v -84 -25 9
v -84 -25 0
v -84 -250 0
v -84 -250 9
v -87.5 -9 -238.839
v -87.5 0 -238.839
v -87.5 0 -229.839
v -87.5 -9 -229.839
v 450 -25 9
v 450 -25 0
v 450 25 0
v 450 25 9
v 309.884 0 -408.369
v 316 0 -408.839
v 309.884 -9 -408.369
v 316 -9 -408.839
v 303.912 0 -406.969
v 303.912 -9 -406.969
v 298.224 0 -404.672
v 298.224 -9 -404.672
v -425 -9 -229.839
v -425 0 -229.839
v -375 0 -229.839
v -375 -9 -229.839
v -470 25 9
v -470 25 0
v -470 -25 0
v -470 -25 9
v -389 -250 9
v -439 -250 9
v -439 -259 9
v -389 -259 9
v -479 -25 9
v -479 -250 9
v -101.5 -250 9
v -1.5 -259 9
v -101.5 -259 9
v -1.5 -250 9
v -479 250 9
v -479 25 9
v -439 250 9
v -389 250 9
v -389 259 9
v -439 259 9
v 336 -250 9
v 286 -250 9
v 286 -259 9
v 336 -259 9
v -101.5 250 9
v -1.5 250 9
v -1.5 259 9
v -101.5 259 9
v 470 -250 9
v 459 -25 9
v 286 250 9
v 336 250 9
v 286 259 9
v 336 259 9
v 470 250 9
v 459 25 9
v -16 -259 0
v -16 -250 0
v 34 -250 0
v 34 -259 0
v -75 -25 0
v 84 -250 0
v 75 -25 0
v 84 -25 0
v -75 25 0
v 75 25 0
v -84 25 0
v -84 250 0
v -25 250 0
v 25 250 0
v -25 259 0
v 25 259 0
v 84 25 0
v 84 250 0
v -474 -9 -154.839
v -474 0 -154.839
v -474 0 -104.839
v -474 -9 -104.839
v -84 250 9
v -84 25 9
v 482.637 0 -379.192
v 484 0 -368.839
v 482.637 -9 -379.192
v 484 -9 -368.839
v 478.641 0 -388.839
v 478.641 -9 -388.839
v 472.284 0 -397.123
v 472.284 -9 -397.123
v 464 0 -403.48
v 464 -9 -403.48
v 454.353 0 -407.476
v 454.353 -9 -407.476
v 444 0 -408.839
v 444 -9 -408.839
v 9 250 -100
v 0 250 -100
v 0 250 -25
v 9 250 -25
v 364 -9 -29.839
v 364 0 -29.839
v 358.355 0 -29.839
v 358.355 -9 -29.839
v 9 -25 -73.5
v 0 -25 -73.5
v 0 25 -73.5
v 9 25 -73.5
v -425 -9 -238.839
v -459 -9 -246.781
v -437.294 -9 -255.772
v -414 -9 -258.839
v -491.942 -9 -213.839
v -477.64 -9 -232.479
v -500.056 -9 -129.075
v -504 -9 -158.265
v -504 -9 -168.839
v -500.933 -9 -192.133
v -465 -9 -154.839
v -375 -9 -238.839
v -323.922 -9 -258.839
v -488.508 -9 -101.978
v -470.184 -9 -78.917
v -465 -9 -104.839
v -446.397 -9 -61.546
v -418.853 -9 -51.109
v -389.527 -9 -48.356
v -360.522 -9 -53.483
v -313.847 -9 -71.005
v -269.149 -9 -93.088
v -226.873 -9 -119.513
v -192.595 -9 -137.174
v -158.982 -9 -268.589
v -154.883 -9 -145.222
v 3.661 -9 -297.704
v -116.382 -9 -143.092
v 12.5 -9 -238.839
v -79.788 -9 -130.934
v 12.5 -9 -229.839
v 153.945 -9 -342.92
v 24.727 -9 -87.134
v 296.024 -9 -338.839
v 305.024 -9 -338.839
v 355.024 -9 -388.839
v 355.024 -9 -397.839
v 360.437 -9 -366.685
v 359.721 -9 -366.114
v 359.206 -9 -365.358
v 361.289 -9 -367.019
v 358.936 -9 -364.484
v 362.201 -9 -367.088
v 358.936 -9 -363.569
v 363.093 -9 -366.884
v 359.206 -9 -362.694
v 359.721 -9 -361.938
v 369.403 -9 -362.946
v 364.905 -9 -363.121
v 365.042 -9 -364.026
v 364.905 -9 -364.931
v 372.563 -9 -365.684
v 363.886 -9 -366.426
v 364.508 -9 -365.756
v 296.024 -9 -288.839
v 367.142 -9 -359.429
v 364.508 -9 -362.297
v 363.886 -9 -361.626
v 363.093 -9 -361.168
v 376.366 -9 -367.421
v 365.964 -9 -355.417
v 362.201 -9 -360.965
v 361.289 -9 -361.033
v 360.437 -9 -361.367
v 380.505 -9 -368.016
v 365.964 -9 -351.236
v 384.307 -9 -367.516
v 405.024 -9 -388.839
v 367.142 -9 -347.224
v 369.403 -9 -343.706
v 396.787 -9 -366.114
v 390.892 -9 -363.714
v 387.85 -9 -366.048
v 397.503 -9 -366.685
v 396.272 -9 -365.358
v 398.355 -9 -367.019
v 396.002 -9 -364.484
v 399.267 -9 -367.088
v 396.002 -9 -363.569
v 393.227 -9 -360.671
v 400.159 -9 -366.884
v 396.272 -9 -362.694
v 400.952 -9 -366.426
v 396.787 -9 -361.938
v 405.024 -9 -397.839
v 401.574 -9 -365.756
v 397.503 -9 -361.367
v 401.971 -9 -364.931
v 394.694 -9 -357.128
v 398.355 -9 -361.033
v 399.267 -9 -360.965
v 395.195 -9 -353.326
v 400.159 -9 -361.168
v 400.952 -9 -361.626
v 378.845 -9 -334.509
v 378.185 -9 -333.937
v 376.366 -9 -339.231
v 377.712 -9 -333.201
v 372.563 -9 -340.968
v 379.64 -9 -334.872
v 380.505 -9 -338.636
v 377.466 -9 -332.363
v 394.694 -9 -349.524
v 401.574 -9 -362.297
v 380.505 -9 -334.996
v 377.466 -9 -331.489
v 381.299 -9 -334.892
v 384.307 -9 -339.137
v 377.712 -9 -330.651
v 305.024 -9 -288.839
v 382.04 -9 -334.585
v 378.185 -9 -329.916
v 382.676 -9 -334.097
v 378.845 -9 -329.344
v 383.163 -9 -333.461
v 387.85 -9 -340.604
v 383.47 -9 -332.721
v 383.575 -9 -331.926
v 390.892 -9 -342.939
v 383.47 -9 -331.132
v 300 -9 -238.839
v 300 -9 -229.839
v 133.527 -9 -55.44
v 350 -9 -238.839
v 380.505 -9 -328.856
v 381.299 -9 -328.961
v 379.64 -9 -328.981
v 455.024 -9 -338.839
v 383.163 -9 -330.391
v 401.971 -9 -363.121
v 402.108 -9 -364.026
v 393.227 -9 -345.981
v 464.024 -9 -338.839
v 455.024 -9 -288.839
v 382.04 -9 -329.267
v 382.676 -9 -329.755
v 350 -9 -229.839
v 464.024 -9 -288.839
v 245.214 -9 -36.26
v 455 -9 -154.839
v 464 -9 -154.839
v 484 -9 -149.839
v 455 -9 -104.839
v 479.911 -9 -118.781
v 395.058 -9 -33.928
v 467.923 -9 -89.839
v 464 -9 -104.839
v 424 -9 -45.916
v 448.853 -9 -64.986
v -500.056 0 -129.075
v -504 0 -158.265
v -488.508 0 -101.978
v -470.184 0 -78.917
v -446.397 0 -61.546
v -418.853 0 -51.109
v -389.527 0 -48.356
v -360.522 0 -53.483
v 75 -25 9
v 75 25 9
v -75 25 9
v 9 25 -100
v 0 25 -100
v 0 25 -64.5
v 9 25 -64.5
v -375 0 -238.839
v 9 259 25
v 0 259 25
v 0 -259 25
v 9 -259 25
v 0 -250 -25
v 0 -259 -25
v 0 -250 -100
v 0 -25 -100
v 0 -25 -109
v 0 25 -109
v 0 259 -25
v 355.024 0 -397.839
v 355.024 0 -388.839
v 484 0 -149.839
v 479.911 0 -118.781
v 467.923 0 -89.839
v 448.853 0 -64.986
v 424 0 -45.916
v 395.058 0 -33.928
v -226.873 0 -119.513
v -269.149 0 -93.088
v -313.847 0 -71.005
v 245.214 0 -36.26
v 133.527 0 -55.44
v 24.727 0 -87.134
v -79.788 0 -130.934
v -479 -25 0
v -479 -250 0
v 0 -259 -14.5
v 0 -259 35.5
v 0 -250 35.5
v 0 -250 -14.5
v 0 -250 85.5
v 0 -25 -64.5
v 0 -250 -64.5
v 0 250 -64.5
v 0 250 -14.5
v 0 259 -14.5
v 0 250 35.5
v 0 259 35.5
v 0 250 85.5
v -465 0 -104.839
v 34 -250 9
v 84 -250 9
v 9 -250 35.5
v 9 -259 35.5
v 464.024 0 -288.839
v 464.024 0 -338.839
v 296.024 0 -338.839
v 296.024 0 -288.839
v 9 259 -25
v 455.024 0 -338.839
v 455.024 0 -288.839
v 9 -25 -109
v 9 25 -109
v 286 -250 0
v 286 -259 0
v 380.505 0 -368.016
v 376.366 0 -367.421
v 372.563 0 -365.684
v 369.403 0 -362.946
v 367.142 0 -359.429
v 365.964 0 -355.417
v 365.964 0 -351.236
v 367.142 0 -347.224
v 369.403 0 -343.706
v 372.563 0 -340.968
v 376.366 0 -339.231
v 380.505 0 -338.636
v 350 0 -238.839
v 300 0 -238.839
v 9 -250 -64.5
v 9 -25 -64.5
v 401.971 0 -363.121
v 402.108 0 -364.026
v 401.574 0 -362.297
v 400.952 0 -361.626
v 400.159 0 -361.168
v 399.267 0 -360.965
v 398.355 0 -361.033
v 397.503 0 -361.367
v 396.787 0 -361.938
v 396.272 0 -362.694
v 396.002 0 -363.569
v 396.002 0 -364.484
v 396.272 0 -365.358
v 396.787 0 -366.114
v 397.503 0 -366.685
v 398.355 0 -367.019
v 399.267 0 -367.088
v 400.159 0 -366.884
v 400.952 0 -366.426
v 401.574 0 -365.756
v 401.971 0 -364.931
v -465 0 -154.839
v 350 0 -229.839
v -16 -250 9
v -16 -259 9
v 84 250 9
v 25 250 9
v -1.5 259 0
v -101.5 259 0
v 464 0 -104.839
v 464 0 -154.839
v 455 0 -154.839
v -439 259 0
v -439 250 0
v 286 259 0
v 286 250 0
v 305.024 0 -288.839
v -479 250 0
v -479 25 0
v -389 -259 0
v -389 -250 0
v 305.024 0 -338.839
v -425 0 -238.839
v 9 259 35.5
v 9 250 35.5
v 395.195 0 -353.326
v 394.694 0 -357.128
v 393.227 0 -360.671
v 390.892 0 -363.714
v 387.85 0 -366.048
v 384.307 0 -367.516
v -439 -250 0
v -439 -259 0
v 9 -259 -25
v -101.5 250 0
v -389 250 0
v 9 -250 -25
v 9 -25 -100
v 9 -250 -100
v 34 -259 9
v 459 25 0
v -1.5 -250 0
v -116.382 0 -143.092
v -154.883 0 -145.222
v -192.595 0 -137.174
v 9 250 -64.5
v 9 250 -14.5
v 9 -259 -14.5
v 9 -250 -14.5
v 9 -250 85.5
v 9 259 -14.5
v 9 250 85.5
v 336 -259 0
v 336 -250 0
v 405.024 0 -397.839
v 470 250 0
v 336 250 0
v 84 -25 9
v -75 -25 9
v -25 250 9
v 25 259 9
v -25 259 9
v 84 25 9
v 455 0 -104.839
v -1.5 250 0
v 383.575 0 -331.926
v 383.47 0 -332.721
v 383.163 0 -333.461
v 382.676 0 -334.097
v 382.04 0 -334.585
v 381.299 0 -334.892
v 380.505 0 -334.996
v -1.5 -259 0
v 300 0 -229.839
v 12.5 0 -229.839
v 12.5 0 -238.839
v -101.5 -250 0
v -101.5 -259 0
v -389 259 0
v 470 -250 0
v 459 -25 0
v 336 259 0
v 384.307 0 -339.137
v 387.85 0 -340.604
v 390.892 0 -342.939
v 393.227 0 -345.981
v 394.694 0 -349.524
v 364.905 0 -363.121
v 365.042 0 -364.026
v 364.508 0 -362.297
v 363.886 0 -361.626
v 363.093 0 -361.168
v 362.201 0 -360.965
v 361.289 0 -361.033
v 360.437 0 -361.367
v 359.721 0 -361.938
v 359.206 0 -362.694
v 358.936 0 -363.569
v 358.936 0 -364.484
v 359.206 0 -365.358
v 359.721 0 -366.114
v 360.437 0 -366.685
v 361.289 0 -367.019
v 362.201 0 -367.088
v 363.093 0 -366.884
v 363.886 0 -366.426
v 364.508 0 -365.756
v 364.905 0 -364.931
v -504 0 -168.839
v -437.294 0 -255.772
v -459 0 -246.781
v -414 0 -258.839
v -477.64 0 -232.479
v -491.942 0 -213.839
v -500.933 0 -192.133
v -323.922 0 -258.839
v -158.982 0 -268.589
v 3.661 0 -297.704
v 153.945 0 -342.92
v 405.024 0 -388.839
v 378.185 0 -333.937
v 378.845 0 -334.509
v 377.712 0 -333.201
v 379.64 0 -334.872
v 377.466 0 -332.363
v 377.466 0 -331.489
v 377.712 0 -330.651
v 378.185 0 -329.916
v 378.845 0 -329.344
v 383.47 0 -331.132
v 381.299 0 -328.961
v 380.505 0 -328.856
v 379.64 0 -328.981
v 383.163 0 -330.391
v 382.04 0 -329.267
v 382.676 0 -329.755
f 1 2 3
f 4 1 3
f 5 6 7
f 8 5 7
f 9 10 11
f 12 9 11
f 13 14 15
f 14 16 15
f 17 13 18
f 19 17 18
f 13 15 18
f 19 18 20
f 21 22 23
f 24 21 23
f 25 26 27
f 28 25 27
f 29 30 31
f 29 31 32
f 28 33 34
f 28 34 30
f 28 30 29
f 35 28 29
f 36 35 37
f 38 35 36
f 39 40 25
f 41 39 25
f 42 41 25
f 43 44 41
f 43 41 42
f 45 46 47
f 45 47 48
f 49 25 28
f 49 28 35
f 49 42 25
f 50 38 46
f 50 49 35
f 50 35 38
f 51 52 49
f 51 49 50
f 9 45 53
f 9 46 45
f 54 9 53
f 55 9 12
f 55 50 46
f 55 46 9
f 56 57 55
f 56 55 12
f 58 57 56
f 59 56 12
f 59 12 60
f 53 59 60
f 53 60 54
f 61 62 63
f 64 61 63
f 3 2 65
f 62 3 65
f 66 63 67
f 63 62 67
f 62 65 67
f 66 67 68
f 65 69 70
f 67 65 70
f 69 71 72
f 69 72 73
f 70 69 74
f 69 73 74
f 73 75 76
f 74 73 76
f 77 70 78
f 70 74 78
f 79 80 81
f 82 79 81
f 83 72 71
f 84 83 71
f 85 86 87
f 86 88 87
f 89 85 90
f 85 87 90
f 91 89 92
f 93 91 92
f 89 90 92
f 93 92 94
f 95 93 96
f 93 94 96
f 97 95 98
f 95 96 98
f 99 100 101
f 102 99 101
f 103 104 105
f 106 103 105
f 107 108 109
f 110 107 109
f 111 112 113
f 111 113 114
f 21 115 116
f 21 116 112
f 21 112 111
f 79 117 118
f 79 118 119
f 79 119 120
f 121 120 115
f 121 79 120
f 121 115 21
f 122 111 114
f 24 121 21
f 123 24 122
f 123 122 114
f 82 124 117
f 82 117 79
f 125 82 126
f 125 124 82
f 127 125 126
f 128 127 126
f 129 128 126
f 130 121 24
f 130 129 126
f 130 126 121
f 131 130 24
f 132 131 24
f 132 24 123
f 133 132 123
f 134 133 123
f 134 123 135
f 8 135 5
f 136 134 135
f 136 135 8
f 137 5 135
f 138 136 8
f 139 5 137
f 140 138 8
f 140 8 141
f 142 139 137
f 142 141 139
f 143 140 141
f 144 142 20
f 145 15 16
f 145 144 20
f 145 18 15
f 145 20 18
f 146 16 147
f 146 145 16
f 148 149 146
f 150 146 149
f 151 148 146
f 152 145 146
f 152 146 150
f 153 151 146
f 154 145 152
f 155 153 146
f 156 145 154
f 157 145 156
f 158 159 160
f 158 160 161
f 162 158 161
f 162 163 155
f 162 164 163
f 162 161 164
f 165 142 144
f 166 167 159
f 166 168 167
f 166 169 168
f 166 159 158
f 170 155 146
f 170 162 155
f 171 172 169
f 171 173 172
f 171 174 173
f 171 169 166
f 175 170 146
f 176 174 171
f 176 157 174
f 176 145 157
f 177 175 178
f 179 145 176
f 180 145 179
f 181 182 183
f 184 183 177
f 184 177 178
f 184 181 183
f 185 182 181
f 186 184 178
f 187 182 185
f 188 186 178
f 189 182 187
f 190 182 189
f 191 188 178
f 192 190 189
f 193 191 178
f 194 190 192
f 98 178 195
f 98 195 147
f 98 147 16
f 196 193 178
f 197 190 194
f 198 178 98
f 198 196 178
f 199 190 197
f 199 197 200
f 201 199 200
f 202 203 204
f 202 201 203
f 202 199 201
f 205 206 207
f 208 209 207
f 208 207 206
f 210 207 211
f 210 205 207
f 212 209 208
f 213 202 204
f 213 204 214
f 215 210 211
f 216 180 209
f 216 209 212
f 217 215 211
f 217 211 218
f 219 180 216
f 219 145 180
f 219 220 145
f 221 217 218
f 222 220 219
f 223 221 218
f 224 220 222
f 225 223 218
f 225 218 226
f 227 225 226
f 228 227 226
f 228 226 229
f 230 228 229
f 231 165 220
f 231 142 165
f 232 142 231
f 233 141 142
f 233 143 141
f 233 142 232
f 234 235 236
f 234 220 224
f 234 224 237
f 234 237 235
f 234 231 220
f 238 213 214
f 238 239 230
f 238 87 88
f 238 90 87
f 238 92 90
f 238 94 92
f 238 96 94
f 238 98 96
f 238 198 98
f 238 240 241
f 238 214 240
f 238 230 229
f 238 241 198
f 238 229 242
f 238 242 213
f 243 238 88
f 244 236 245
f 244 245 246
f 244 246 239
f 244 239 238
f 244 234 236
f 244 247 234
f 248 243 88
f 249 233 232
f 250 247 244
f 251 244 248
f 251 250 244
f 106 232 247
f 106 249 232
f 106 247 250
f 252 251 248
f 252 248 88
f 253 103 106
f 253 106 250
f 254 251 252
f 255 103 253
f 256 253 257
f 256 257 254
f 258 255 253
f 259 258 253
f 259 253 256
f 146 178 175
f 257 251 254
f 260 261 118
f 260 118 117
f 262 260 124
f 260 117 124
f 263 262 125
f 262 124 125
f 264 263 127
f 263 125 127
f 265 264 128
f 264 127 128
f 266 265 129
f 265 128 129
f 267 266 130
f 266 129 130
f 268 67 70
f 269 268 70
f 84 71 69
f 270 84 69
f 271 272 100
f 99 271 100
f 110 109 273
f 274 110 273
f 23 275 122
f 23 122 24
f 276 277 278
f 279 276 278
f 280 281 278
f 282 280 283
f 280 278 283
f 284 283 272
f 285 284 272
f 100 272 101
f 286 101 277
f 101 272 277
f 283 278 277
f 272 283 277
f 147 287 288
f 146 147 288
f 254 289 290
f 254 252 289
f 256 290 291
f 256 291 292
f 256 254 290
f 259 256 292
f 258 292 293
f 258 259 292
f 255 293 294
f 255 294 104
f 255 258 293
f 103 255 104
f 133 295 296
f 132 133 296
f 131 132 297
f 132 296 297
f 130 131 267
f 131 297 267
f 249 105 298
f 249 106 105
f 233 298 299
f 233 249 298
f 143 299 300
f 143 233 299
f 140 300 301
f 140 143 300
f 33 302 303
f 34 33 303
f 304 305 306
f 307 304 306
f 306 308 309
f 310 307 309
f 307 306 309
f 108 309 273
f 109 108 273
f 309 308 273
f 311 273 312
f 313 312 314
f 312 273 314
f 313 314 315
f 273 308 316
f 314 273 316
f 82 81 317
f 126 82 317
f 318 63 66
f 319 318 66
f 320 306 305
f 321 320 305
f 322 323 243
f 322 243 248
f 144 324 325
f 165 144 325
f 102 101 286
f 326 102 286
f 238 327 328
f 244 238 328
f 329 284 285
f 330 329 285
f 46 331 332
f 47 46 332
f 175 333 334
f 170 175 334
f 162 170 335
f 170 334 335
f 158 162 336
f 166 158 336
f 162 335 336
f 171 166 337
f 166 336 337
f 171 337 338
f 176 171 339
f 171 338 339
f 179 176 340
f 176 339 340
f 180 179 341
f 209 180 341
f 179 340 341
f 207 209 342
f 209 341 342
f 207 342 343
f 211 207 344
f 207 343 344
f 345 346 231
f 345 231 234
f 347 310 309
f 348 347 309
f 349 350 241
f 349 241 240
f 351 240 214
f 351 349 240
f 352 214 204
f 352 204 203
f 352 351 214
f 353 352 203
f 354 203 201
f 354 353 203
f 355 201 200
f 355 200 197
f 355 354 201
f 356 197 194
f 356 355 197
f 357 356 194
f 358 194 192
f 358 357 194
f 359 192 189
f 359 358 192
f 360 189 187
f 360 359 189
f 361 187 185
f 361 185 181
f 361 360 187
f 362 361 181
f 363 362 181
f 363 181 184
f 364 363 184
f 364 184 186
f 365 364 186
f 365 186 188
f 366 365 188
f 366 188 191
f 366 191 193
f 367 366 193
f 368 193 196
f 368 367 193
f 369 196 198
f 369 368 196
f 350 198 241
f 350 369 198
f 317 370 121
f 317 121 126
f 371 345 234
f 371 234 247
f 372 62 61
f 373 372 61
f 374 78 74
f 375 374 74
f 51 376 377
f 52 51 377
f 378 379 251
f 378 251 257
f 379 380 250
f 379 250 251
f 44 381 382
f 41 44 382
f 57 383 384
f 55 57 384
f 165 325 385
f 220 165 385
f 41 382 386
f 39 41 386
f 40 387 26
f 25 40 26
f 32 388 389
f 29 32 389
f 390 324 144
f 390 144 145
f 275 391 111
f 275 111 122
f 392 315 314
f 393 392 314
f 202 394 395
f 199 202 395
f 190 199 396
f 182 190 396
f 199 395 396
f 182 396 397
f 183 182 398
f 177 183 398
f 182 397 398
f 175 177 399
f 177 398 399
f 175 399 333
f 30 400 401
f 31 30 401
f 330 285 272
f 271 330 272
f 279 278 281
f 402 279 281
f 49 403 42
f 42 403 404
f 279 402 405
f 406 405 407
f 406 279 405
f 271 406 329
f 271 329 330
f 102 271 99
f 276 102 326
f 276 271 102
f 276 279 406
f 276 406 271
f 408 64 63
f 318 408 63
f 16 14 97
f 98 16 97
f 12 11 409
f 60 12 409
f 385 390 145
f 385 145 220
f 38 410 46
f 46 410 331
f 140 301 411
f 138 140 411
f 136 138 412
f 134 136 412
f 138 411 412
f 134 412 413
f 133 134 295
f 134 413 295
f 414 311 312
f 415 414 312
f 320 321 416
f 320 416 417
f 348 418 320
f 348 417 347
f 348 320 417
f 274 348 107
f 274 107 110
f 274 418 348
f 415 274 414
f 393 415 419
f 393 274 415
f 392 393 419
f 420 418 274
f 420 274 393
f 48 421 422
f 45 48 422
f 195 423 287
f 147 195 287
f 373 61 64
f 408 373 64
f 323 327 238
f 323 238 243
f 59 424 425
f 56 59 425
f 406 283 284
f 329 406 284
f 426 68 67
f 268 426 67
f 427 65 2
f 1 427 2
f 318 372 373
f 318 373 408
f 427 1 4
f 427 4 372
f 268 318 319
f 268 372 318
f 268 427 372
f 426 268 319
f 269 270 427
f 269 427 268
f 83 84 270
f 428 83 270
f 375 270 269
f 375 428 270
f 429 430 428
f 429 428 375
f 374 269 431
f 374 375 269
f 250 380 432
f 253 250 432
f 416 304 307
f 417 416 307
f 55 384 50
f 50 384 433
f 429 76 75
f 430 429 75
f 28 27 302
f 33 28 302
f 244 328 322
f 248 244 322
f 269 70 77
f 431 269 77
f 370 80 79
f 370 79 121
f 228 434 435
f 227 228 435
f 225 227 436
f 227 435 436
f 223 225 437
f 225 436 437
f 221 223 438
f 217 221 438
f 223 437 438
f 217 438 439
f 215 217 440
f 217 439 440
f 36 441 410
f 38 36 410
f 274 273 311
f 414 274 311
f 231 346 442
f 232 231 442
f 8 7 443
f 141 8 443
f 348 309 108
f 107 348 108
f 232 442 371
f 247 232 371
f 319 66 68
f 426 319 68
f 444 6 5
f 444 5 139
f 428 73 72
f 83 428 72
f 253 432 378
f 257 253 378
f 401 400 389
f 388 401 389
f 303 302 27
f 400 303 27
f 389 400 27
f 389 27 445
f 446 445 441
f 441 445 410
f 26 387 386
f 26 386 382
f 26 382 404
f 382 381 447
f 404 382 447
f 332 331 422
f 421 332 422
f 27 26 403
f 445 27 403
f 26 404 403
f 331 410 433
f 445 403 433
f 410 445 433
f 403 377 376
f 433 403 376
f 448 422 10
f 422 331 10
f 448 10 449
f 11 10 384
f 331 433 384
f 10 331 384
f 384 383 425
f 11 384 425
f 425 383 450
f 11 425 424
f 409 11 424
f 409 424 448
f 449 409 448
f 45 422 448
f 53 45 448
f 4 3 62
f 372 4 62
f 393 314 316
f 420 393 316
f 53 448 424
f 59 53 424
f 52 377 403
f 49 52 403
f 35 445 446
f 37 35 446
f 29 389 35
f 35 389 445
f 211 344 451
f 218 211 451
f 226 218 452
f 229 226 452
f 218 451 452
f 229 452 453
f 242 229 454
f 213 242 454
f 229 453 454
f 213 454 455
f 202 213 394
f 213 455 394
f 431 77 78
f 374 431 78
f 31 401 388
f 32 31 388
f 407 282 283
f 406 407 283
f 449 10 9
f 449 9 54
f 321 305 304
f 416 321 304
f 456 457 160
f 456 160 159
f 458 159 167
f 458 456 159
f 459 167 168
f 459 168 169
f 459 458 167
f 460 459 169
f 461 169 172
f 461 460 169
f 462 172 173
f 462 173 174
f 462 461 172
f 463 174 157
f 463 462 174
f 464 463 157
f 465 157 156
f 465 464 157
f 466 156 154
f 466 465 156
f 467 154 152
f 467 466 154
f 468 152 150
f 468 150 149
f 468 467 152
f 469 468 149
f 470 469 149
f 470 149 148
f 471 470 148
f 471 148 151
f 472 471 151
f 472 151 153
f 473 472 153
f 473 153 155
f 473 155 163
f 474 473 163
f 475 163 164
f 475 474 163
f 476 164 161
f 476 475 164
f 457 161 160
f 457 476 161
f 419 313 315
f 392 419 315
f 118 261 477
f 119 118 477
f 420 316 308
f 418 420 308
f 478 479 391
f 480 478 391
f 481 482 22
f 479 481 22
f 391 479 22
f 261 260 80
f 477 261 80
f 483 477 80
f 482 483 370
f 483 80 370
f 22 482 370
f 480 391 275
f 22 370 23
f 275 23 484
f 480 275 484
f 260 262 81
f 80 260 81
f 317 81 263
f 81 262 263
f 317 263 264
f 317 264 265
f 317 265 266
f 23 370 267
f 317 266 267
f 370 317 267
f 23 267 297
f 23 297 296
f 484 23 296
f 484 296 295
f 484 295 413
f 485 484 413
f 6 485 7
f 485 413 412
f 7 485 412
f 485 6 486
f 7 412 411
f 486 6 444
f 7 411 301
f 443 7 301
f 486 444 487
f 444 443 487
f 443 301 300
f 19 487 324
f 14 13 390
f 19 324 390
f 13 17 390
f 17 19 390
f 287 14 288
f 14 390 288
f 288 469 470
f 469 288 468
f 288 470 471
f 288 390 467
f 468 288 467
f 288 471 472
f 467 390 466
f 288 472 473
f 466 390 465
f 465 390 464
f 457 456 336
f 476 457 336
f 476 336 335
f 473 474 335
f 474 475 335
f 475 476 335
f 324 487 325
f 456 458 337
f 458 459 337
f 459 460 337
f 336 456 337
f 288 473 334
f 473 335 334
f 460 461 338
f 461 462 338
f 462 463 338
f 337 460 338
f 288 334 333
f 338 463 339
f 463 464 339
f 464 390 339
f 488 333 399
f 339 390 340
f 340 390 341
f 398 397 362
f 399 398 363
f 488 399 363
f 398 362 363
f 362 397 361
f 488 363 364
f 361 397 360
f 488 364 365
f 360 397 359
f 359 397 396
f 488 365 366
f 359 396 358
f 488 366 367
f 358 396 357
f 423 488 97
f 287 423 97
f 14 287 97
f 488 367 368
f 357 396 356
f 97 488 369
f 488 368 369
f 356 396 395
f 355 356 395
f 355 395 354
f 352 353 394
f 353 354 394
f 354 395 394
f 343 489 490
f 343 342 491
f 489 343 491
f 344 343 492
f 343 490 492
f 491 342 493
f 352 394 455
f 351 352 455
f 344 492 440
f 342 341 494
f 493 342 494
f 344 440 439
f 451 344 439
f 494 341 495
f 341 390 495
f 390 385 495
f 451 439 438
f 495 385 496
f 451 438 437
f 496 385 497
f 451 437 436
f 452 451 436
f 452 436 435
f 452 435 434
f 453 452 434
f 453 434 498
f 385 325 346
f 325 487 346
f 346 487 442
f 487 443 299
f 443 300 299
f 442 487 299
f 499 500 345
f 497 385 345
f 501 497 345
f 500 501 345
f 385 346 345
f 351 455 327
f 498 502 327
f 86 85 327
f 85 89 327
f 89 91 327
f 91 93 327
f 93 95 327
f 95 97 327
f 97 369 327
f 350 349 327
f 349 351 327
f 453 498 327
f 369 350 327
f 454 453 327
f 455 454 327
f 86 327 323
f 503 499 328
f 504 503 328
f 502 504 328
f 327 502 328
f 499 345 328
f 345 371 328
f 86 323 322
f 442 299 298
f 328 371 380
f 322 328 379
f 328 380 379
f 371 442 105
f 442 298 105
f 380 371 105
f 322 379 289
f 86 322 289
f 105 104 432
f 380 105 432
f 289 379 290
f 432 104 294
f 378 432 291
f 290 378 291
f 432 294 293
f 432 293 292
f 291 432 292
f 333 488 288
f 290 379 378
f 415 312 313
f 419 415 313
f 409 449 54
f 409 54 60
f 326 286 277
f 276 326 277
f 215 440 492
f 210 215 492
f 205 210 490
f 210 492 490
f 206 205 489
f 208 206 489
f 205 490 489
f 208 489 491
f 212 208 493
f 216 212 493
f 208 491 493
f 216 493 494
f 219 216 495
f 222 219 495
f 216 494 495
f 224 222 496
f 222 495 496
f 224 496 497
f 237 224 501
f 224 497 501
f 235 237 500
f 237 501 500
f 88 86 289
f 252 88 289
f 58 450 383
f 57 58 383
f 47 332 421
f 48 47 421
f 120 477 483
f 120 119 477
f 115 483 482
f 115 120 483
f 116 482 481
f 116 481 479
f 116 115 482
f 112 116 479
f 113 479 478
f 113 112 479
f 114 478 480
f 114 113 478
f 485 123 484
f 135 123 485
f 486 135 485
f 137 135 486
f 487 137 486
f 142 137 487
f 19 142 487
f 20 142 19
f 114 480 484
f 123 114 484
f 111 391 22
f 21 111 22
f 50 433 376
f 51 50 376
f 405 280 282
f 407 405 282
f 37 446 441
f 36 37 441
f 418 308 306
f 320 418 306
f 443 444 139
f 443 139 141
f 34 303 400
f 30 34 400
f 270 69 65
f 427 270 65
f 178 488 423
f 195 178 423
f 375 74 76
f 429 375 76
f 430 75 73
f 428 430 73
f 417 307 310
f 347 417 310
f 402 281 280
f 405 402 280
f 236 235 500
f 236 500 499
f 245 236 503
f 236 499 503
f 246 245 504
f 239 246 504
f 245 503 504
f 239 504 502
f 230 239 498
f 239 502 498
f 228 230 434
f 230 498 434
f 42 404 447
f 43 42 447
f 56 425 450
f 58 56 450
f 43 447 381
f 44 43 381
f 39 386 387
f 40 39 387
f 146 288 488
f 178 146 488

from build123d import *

# Parameters (mm, degrees)
F0_W         = 50
F0_H         = 9
F0_W_2       = 100
F0_R         = 3.07
F0_W_3       = 9
F0_H_2       = 50
F5_DEPTH     = 9
F6_R         = 40
F1_W         = 9
F1_H         = 50
F7_DEPTH     = 9
F8_DEPTH     = 9
F9_DEPTH     = 9
F10_R        = 1000
F11_T1_DEPTH = 1098.1124961061
F12_R        = 110
F13_R        = 90
F14_R        = 1400
F15_R        = 120
F16_DEPTH    = 9


# Not quite as in the source:
# - a fillet or chamfer that OpenCascade refuses, or shapes differently, is made with other operations: its cross-section is extruded or revolved along the edge and cut away or added


with BuildPart() as f5:
    # F0 (on Front) → F5 (new body)
    with BuildSketch(Plane.XZ):
        with BuildLine():
            Line((483.9999953733, -408.8390429476), (483.9999953733, -338.8390429476))
            Line((483.9999953733, -338.8390429476), (483.9999953733, -229.8390429476))
            Line((483.9999953733, -229.8390429476), (483.9999953733, -39.8390429476))
            Line((483.9999953733, -39.8390429476), (483.9999953733, -29.8390429476))
            Line((483.9999953733, -29.8390429476), (473.9999953733, -29.8390429476))
            Line((473.9999953733, -29.8390429476), (454.9999953733, -29.8390429476))
            Line((454.9999953733, -29.8390429476), (-1.0377274437, -29.8390429476))
            ThreePointArc((-1.0377274437, -29.8390429476), (-143.6076164246, -145.6589912366), (-286.1775054055, -29.8390429476))
            Line((-286.1775054055, -29.8390429476), (-494.0000046267, -29.8390429476))
            Line((-494.0000046267, -29.8390429476), (-504.0000046267, -29.8390429476))
            Line((-504.0000046267, -29.8390429476), (-504.0000046267, -39.8390429476))
            Line((-504.0000046267, -39.8390429476), (-504.0000046267, -104.8390429476))
            Line((-504.0000046267, -104.8390429476), (-504.0000046267, -258.8390429476))
            Line((-504.0000046267, -258.8390429476), (15.1211131069, -258.8390429476))
            Line((15.1211131069, -258.8390429476), (275.9999953733, -258.8390429476))
            Line((275.9999953733, -258.8390429476), (275.9999953733, -408.8390429476))
            Line((275.9999953733, -408.8390429476), (483.9999953733, -408.8390429476))
        make_face()
        with Locations((-400.0000046267, -234.3390429476)):
            Rectangle(F0_W, F0_H, mode=Mode.SUBTRACT)
        with Locations((-37.5000046267, -234.3390429476)):
            Rectangle(F0_W_2, F0_H, mode=Mode.SUBTRACT)
        Polygon((380.5047589158, -388.8390429476), (405.0242262696, -388.8390429476), (405.0242262696, -397.8390429476), (355.0242262696, -397.8390429476), (355.0242262696, -388.8390429476), align=None, mode=Mode.SUBTRACT)
        with Locations((361.9718573535, -364.0261951481)):
            Circle(F0_R, mode=Mode.SUBTRACT)
        with Locations((399.0377446354, -364.0261465598)):
            Circle(F0_R, mode=Mode.SUBTRACT)
        with BuildLine():
            ThreePointArc((395.1947869682, -353.3261708539), (390.8921756658, -363.7135793876), (380.5047589158, -368.0161708539))
            ThreePointArc((380.5047589158, -368.0161708539), (365.8147869682, -353.3261708539), (380.5047589158, -338.636170854))
            ThreePointArc((380.5047589158, -338.636170854), (390.8921756658, -342.9387623203), (395.1947869682, -353.3261708539))
        make_face(mode=Mode.SUBTRACT)
        with BuildLine():
            ThreePointArc((383.5747589158, -331.9261708539), (382.675576734, -334.0969886722), (380.5047589158, -334.9961708539))
            ThreePointArc((380.5047589158, -334.9961708539), (377.4347589158, -331.9261708539), (380.5047589158, -328.8561708539))
            ThreePointArc((380.5047589158, -328.8561708539), (382.675576734, -329.7553530357), (383.5747589158, -331.9261708539))
        make_face(mode=Mode.SUBTRACT)
        with Locations((300.5242262696, -313.8390429476)):
            Rectangle(F0_W_3, F0_H_2, mode=Mode.SUBTRACT)
        with Locations((459.5242262696, -313.8390429476)):
            Rectangle(F0_W_3, F0_H_2, mode=Mode.SUBTRACT)
        with Locations((325, -234.3390429476)):
            Rectangle(F0_W, F0_H, mode=Mode.SUBTRACT)
        with Locations((-469.5000046267, -129.8390429476)):
            Rectangle(F0_W_3, F0_H_2, mode=Mode.SUBTRACT)
        with Locations((459.4999953733, -129.8390429476)):
            Rectangle(F0_W_3, F0_H_2, mode=Mode.SUBTRACT)
    extrude(amount=F5_DEPTH)

    # F6
    f6_edges = [f5.edges().sort_by_distance(p)[0] for p in [
        (483.999995, -4.5, -408.839043),
        (275.999995, -4.5, -408.839043),
    ]]
    fillet(f6_edges, radius=F6_R)

    # F10
    f10_edges = [f5.edges().sort_by_distance(p)[0] for p in [
        (-1.037727, -4.5, -29.839043),
    ]]
    fillet(f10_edges, radius=F10_R)

    # F11: fillet of radius 500 on 1 edges, made by hand

    # F11_s2 → F11_t1 (cut)
    with BuildSketch(Plane.XZ.offset(-544.5562480531)):
        with BuildLine():
            ThreePointArc((-226.8730033326, -119.5132506089), (-358.7618430578, -54.0489361882), (-504.0000046267, -29.8390429476))
            Line((-504.0000046267, -29.8390429476), (-286.1775054055, -29.8390429476))
            ThreePointArc((-286.1775054055, -29.8390429476), (-265.1014798041, -80.3478866503), (-226.8730033326, -119.5132506089))
        make_face()
    extrude(amount=F11_T1_DEPTH, mode=Mode.SUBTRACT)

    # F12
    f12_edges = [f5.edges().sort_by_distance(p)[0] for p in [
        (-504.000005, -4.5, -29.839043),
    ]]
    fillet(f12_edges, radius=F12_R)

    # F13
    f13_edges = [f5.edges().sort_by_distance(p)[0] for p in [
        (-504.000005, -4.5, -258.839043),
    ]]
    fillet(f13_edges, radius=F13_R)

    # F14
    f14_edges = [f5.edges().sort_by_distance(p)[0] for p in [
        (275.999995, -4.5, -258.839043),
    ]]
    fillet(f14_edges, radius=F14_R)

    # F15
    f15_edges = [f5.edges().sort_by_distance(p)[0] for p in [
        (483.999995, -4.5, -29.839043),
    ]]
    fillet(f15_edges, radius=F15_R)


with BuildPart() as f7:
    # F1 (on Top) → F7 (new body)
    with BuildSketch(Plane.XY):
        Polygon((470, -250), (470, 250), (336, 250), (336, 259), (286, 259), (286, 250), (-1.5, 250), (-1.5, 259), (-101.5, 259), (-101.5, 250), (-389, 250), (-389, 259), (-439, 259), (-439, 250), (-479, 250), (-479, 25), (-470, 25), (-470, -25), (-479, -25), (-479, -250), (-439, -250), (-439, -259), (-389, -259), (-389, -250), (-101.5, -250), (-101.5, -259), (-1.5, -259), (-1.5, -250), (286, -250), (286, -259), (336, -259), (336, -250), align=None)
        with Locations((454.5, 0)):
            Rectangle(F1_W, F1_H, mode=Mode.SUBTRACT)
    extrude(amount=F7_DEPTH)


with BuildPart() as f8:
    # F3 (on face) → F8 (new body)
    with BuildSketch(Plane.XY):
        Polygon((34, -250), (84, -250), (84, -25), (75, -25), (75, 25), (84, 25), (84, 250), (25, 250), (25, 259), (-25, 259), (-25, 250), (-84, 250), (-84, 25), (-75, 25), (-75, -25), (-84, -25), (-84, -250), (-16, -250), (-16, -259), (34, -259), align=None)
    extrude(amount=F8_DEPTH)


with BuildPart() as f9:
    # F4 (on face) → F9 (new body)
    with BuildSketch(Plane.YZ):
        Polygon((250, 35.5), (250, 85.5), (25, 85.5), (-25, 85.5), (-250, 85.5), (-250, 35.5), (-259, 35.5), (-259, -14.5), (-250, -14.5), (-250, -64.5), (-25, -64.5), (-25, -73.5), (25, -73.5), (25, -64.5), (250, -64.5), (250, -14.5), (259, -14.5), (259, 35.5), align=None)
    extrude(amount=F9_DEPTH)


with BuildPart() as f16:
    # F2 (on Right) → F16 (new body)
    with BuildSketch(Plane.YZ):
        Polygon((-250, -25), (-250, -100), (-25, -100), (-25, -109), (25, -109), (25, -100), (250, -100), (250, -25), (259, -25), (259, 25), (250, 25), (-250, 25), (-259, 25), (-259, -25), align=None)
    extrude(amount=F16_DEPTH)


solid = Compound([f5.part, f7.part, f8.part, f9.part, f16.part])
